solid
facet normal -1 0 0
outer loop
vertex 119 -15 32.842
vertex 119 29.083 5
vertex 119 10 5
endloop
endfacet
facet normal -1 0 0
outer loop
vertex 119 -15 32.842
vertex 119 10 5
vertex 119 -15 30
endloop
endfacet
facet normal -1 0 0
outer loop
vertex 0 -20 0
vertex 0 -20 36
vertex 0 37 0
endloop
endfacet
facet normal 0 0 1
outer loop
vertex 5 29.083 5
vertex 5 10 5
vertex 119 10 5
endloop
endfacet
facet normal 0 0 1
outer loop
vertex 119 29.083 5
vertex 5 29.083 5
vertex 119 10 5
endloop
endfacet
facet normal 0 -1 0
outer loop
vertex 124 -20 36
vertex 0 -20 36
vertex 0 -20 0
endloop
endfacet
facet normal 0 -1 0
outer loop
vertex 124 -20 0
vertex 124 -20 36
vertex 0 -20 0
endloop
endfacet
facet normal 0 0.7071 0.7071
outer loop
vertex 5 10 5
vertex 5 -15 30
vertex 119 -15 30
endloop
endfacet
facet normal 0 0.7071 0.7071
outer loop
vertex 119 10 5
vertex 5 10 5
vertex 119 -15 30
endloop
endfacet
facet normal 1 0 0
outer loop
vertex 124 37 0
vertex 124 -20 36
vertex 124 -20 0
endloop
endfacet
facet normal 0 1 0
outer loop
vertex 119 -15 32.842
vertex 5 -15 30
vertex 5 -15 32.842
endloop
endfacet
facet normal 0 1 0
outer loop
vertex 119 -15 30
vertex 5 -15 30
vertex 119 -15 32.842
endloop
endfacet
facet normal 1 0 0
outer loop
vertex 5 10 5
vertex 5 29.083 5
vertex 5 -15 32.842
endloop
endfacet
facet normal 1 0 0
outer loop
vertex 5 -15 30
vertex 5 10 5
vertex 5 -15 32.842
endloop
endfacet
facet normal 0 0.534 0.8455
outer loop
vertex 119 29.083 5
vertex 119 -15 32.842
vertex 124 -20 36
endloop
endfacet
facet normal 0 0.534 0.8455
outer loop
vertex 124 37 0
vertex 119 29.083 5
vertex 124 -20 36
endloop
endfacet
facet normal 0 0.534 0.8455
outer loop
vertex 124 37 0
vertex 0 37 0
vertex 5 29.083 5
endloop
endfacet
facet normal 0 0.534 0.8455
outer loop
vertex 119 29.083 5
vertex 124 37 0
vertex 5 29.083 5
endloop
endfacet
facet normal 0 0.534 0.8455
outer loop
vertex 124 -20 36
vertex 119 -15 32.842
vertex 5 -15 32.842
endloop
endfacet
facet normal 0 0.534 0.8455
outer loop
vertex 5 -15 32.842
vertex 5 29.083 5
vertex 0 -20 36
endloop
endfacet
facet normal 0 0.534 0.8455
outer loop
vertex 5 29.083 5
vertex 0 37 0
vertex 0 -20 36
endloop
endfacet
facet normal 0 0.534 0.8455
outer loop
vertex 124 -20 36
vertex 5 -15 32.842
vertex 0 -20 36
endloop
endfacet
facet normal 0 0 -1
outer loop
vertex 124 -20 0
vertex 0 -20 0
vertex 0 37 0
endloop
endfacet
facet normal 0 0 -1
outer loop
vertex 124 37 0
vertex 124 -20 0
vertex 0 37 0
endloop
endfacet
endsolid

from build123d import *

# Parameters (mm, degrees)
F1_DEPTH = 124
F3_START = -5
F2_W     = 114
F2_H     = 52
F3_DEPTH = 31.001
F4_SIZE  = 25


with BuildPart() as f1:
    # F0 (on Right) → F1 (new body)
    with BuildSketch(Plane.YZ):
        Polygon((-20, 36), (-20, 0), (37, 0), align=None)
    extrude(amount=F1_DEPTH)

    # F2 (on face) → F3 (cut)
    with BuildSketch(Plane(origin=(0, 0, 0), x_dir=(1, 0, 0), z_dir=(0, 0, -1)).offset(F3_START)):
        with Locations((62, -11)):
            Rectangle(F2_W, F2_H)
    extrude(amount=-F3_DEPTH, mode=Mode.SUBTRACT)

    # F4
    f4_edges = [f1.edges().sort_by_distance(p)[0] for p in [
        (62, -15, 5),
    ]]
    chamfer(f4_edges, length=F4_SIZE)


solid = f1.part
